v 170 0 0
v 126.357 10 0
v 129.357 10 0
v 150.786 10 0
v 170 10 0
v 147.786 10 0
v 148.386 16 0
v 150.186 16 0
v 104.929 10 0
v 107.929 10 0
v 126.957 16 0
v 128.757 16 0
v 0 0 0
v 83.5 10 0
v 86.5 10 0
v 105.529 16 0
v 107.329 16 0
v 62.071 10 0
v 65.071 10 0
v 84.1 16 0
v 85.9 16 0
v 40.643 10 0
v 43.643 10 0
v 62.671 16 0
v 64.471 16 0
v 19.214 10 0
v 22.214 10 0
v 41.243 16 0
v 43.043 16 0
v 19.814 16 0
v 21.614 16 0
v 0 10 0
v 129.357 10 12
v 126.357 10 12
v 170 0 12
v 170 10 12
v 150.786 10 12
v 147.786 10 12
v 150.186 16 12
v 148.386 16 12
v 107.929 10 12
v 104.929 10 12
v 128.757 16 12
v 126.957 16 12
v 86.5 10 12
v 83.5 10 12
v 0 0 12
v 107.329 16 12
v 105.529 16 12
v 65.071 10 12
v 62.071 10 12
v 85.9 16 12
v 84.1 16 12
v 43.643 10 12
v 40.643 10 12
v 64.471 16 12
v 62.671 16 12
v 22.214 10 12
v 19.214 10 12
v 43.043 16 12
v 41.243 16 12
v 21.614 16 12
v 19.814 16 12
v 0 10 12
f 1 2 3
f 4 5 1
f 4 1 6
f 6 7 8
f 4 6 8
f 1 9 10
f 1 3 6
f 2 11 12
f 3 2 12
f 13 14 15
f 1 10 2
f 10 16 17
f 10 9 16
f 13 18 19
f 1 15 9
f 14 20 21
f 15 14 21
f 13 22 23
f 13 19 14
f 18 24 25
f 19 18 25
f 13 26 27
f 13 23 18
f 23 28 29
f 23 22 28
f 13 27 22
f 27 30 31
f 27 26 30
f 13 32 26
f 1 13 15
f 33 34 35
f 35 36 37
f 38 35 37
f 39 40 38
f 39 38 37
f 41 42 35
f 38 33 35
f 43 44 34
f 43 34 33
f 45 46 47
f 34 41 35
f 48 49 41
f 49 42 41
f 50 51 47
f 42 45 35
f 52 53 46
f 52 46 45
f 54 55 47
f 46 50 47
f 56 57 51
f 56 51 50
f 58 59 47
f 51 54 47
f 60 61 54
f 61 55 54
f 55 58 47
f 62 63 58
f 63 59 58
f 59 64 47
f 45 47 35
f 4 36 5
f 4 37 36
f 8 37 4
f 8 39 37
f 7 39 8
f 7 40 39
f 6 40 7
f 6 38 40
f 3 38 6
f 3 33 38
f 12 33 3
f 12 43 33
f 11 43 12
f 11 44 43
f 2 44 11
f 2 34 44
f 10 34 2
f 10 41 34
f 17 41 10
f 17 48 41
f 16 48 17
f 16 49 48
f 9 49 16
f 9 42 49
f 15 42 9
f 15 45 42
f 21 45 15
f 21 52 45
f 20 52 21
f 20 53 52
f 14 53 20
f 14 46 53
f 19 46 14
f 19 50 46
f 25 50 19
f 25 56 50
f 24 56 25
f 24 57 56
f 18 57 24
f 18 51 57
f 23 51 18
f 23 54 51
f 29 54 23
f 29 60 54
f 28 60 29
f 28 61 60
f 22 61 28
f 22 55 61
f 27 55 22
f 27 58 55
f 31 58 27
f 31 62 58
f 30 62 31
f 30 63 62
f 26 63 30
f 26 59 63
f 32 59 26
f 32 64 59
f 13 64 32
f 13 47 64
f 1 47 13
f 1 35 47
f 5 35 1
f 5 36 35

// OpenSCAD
$fn = 32;

// ----------------------------------------------------------------------
// Gear rack: 7 teeth on a 170 mm bar, pitch 21.43 mm
// ----------------------------------------------------------------------

// --- parameters (mm) ---
profile_height = 12;      // extrusion height
profile_points = 32;      // points of the closed outline

profile = [[0, 0], [170, 0], [170, 10], [150.786, 10], [150.186, 16], [148.386, 16], [147.786, 10], [129.357, 10], [128.757, 16], [126.957, 16], [126.357, 10], [107.929, 10], [107.329, 16], [105.529, 16], [104.929, 10], [86.5, 10], [85.9, 16], [84.1, 16], [83.5, 10], [65.071, 10], [64.471, 16], [62.671, 16], [62.071, 10], [43.643, 10], [43.043, 16], [41.243, 16], [40.643, 10], [22.214, 10], [21.614, 16], [19.814, 16], [19.214, 10], [0, 10]];  // single closed polygon, 32 points, counter clockwise

// --- the one profile operation ---
linear_extrude(height = profile_height) polygon(points = profile);
